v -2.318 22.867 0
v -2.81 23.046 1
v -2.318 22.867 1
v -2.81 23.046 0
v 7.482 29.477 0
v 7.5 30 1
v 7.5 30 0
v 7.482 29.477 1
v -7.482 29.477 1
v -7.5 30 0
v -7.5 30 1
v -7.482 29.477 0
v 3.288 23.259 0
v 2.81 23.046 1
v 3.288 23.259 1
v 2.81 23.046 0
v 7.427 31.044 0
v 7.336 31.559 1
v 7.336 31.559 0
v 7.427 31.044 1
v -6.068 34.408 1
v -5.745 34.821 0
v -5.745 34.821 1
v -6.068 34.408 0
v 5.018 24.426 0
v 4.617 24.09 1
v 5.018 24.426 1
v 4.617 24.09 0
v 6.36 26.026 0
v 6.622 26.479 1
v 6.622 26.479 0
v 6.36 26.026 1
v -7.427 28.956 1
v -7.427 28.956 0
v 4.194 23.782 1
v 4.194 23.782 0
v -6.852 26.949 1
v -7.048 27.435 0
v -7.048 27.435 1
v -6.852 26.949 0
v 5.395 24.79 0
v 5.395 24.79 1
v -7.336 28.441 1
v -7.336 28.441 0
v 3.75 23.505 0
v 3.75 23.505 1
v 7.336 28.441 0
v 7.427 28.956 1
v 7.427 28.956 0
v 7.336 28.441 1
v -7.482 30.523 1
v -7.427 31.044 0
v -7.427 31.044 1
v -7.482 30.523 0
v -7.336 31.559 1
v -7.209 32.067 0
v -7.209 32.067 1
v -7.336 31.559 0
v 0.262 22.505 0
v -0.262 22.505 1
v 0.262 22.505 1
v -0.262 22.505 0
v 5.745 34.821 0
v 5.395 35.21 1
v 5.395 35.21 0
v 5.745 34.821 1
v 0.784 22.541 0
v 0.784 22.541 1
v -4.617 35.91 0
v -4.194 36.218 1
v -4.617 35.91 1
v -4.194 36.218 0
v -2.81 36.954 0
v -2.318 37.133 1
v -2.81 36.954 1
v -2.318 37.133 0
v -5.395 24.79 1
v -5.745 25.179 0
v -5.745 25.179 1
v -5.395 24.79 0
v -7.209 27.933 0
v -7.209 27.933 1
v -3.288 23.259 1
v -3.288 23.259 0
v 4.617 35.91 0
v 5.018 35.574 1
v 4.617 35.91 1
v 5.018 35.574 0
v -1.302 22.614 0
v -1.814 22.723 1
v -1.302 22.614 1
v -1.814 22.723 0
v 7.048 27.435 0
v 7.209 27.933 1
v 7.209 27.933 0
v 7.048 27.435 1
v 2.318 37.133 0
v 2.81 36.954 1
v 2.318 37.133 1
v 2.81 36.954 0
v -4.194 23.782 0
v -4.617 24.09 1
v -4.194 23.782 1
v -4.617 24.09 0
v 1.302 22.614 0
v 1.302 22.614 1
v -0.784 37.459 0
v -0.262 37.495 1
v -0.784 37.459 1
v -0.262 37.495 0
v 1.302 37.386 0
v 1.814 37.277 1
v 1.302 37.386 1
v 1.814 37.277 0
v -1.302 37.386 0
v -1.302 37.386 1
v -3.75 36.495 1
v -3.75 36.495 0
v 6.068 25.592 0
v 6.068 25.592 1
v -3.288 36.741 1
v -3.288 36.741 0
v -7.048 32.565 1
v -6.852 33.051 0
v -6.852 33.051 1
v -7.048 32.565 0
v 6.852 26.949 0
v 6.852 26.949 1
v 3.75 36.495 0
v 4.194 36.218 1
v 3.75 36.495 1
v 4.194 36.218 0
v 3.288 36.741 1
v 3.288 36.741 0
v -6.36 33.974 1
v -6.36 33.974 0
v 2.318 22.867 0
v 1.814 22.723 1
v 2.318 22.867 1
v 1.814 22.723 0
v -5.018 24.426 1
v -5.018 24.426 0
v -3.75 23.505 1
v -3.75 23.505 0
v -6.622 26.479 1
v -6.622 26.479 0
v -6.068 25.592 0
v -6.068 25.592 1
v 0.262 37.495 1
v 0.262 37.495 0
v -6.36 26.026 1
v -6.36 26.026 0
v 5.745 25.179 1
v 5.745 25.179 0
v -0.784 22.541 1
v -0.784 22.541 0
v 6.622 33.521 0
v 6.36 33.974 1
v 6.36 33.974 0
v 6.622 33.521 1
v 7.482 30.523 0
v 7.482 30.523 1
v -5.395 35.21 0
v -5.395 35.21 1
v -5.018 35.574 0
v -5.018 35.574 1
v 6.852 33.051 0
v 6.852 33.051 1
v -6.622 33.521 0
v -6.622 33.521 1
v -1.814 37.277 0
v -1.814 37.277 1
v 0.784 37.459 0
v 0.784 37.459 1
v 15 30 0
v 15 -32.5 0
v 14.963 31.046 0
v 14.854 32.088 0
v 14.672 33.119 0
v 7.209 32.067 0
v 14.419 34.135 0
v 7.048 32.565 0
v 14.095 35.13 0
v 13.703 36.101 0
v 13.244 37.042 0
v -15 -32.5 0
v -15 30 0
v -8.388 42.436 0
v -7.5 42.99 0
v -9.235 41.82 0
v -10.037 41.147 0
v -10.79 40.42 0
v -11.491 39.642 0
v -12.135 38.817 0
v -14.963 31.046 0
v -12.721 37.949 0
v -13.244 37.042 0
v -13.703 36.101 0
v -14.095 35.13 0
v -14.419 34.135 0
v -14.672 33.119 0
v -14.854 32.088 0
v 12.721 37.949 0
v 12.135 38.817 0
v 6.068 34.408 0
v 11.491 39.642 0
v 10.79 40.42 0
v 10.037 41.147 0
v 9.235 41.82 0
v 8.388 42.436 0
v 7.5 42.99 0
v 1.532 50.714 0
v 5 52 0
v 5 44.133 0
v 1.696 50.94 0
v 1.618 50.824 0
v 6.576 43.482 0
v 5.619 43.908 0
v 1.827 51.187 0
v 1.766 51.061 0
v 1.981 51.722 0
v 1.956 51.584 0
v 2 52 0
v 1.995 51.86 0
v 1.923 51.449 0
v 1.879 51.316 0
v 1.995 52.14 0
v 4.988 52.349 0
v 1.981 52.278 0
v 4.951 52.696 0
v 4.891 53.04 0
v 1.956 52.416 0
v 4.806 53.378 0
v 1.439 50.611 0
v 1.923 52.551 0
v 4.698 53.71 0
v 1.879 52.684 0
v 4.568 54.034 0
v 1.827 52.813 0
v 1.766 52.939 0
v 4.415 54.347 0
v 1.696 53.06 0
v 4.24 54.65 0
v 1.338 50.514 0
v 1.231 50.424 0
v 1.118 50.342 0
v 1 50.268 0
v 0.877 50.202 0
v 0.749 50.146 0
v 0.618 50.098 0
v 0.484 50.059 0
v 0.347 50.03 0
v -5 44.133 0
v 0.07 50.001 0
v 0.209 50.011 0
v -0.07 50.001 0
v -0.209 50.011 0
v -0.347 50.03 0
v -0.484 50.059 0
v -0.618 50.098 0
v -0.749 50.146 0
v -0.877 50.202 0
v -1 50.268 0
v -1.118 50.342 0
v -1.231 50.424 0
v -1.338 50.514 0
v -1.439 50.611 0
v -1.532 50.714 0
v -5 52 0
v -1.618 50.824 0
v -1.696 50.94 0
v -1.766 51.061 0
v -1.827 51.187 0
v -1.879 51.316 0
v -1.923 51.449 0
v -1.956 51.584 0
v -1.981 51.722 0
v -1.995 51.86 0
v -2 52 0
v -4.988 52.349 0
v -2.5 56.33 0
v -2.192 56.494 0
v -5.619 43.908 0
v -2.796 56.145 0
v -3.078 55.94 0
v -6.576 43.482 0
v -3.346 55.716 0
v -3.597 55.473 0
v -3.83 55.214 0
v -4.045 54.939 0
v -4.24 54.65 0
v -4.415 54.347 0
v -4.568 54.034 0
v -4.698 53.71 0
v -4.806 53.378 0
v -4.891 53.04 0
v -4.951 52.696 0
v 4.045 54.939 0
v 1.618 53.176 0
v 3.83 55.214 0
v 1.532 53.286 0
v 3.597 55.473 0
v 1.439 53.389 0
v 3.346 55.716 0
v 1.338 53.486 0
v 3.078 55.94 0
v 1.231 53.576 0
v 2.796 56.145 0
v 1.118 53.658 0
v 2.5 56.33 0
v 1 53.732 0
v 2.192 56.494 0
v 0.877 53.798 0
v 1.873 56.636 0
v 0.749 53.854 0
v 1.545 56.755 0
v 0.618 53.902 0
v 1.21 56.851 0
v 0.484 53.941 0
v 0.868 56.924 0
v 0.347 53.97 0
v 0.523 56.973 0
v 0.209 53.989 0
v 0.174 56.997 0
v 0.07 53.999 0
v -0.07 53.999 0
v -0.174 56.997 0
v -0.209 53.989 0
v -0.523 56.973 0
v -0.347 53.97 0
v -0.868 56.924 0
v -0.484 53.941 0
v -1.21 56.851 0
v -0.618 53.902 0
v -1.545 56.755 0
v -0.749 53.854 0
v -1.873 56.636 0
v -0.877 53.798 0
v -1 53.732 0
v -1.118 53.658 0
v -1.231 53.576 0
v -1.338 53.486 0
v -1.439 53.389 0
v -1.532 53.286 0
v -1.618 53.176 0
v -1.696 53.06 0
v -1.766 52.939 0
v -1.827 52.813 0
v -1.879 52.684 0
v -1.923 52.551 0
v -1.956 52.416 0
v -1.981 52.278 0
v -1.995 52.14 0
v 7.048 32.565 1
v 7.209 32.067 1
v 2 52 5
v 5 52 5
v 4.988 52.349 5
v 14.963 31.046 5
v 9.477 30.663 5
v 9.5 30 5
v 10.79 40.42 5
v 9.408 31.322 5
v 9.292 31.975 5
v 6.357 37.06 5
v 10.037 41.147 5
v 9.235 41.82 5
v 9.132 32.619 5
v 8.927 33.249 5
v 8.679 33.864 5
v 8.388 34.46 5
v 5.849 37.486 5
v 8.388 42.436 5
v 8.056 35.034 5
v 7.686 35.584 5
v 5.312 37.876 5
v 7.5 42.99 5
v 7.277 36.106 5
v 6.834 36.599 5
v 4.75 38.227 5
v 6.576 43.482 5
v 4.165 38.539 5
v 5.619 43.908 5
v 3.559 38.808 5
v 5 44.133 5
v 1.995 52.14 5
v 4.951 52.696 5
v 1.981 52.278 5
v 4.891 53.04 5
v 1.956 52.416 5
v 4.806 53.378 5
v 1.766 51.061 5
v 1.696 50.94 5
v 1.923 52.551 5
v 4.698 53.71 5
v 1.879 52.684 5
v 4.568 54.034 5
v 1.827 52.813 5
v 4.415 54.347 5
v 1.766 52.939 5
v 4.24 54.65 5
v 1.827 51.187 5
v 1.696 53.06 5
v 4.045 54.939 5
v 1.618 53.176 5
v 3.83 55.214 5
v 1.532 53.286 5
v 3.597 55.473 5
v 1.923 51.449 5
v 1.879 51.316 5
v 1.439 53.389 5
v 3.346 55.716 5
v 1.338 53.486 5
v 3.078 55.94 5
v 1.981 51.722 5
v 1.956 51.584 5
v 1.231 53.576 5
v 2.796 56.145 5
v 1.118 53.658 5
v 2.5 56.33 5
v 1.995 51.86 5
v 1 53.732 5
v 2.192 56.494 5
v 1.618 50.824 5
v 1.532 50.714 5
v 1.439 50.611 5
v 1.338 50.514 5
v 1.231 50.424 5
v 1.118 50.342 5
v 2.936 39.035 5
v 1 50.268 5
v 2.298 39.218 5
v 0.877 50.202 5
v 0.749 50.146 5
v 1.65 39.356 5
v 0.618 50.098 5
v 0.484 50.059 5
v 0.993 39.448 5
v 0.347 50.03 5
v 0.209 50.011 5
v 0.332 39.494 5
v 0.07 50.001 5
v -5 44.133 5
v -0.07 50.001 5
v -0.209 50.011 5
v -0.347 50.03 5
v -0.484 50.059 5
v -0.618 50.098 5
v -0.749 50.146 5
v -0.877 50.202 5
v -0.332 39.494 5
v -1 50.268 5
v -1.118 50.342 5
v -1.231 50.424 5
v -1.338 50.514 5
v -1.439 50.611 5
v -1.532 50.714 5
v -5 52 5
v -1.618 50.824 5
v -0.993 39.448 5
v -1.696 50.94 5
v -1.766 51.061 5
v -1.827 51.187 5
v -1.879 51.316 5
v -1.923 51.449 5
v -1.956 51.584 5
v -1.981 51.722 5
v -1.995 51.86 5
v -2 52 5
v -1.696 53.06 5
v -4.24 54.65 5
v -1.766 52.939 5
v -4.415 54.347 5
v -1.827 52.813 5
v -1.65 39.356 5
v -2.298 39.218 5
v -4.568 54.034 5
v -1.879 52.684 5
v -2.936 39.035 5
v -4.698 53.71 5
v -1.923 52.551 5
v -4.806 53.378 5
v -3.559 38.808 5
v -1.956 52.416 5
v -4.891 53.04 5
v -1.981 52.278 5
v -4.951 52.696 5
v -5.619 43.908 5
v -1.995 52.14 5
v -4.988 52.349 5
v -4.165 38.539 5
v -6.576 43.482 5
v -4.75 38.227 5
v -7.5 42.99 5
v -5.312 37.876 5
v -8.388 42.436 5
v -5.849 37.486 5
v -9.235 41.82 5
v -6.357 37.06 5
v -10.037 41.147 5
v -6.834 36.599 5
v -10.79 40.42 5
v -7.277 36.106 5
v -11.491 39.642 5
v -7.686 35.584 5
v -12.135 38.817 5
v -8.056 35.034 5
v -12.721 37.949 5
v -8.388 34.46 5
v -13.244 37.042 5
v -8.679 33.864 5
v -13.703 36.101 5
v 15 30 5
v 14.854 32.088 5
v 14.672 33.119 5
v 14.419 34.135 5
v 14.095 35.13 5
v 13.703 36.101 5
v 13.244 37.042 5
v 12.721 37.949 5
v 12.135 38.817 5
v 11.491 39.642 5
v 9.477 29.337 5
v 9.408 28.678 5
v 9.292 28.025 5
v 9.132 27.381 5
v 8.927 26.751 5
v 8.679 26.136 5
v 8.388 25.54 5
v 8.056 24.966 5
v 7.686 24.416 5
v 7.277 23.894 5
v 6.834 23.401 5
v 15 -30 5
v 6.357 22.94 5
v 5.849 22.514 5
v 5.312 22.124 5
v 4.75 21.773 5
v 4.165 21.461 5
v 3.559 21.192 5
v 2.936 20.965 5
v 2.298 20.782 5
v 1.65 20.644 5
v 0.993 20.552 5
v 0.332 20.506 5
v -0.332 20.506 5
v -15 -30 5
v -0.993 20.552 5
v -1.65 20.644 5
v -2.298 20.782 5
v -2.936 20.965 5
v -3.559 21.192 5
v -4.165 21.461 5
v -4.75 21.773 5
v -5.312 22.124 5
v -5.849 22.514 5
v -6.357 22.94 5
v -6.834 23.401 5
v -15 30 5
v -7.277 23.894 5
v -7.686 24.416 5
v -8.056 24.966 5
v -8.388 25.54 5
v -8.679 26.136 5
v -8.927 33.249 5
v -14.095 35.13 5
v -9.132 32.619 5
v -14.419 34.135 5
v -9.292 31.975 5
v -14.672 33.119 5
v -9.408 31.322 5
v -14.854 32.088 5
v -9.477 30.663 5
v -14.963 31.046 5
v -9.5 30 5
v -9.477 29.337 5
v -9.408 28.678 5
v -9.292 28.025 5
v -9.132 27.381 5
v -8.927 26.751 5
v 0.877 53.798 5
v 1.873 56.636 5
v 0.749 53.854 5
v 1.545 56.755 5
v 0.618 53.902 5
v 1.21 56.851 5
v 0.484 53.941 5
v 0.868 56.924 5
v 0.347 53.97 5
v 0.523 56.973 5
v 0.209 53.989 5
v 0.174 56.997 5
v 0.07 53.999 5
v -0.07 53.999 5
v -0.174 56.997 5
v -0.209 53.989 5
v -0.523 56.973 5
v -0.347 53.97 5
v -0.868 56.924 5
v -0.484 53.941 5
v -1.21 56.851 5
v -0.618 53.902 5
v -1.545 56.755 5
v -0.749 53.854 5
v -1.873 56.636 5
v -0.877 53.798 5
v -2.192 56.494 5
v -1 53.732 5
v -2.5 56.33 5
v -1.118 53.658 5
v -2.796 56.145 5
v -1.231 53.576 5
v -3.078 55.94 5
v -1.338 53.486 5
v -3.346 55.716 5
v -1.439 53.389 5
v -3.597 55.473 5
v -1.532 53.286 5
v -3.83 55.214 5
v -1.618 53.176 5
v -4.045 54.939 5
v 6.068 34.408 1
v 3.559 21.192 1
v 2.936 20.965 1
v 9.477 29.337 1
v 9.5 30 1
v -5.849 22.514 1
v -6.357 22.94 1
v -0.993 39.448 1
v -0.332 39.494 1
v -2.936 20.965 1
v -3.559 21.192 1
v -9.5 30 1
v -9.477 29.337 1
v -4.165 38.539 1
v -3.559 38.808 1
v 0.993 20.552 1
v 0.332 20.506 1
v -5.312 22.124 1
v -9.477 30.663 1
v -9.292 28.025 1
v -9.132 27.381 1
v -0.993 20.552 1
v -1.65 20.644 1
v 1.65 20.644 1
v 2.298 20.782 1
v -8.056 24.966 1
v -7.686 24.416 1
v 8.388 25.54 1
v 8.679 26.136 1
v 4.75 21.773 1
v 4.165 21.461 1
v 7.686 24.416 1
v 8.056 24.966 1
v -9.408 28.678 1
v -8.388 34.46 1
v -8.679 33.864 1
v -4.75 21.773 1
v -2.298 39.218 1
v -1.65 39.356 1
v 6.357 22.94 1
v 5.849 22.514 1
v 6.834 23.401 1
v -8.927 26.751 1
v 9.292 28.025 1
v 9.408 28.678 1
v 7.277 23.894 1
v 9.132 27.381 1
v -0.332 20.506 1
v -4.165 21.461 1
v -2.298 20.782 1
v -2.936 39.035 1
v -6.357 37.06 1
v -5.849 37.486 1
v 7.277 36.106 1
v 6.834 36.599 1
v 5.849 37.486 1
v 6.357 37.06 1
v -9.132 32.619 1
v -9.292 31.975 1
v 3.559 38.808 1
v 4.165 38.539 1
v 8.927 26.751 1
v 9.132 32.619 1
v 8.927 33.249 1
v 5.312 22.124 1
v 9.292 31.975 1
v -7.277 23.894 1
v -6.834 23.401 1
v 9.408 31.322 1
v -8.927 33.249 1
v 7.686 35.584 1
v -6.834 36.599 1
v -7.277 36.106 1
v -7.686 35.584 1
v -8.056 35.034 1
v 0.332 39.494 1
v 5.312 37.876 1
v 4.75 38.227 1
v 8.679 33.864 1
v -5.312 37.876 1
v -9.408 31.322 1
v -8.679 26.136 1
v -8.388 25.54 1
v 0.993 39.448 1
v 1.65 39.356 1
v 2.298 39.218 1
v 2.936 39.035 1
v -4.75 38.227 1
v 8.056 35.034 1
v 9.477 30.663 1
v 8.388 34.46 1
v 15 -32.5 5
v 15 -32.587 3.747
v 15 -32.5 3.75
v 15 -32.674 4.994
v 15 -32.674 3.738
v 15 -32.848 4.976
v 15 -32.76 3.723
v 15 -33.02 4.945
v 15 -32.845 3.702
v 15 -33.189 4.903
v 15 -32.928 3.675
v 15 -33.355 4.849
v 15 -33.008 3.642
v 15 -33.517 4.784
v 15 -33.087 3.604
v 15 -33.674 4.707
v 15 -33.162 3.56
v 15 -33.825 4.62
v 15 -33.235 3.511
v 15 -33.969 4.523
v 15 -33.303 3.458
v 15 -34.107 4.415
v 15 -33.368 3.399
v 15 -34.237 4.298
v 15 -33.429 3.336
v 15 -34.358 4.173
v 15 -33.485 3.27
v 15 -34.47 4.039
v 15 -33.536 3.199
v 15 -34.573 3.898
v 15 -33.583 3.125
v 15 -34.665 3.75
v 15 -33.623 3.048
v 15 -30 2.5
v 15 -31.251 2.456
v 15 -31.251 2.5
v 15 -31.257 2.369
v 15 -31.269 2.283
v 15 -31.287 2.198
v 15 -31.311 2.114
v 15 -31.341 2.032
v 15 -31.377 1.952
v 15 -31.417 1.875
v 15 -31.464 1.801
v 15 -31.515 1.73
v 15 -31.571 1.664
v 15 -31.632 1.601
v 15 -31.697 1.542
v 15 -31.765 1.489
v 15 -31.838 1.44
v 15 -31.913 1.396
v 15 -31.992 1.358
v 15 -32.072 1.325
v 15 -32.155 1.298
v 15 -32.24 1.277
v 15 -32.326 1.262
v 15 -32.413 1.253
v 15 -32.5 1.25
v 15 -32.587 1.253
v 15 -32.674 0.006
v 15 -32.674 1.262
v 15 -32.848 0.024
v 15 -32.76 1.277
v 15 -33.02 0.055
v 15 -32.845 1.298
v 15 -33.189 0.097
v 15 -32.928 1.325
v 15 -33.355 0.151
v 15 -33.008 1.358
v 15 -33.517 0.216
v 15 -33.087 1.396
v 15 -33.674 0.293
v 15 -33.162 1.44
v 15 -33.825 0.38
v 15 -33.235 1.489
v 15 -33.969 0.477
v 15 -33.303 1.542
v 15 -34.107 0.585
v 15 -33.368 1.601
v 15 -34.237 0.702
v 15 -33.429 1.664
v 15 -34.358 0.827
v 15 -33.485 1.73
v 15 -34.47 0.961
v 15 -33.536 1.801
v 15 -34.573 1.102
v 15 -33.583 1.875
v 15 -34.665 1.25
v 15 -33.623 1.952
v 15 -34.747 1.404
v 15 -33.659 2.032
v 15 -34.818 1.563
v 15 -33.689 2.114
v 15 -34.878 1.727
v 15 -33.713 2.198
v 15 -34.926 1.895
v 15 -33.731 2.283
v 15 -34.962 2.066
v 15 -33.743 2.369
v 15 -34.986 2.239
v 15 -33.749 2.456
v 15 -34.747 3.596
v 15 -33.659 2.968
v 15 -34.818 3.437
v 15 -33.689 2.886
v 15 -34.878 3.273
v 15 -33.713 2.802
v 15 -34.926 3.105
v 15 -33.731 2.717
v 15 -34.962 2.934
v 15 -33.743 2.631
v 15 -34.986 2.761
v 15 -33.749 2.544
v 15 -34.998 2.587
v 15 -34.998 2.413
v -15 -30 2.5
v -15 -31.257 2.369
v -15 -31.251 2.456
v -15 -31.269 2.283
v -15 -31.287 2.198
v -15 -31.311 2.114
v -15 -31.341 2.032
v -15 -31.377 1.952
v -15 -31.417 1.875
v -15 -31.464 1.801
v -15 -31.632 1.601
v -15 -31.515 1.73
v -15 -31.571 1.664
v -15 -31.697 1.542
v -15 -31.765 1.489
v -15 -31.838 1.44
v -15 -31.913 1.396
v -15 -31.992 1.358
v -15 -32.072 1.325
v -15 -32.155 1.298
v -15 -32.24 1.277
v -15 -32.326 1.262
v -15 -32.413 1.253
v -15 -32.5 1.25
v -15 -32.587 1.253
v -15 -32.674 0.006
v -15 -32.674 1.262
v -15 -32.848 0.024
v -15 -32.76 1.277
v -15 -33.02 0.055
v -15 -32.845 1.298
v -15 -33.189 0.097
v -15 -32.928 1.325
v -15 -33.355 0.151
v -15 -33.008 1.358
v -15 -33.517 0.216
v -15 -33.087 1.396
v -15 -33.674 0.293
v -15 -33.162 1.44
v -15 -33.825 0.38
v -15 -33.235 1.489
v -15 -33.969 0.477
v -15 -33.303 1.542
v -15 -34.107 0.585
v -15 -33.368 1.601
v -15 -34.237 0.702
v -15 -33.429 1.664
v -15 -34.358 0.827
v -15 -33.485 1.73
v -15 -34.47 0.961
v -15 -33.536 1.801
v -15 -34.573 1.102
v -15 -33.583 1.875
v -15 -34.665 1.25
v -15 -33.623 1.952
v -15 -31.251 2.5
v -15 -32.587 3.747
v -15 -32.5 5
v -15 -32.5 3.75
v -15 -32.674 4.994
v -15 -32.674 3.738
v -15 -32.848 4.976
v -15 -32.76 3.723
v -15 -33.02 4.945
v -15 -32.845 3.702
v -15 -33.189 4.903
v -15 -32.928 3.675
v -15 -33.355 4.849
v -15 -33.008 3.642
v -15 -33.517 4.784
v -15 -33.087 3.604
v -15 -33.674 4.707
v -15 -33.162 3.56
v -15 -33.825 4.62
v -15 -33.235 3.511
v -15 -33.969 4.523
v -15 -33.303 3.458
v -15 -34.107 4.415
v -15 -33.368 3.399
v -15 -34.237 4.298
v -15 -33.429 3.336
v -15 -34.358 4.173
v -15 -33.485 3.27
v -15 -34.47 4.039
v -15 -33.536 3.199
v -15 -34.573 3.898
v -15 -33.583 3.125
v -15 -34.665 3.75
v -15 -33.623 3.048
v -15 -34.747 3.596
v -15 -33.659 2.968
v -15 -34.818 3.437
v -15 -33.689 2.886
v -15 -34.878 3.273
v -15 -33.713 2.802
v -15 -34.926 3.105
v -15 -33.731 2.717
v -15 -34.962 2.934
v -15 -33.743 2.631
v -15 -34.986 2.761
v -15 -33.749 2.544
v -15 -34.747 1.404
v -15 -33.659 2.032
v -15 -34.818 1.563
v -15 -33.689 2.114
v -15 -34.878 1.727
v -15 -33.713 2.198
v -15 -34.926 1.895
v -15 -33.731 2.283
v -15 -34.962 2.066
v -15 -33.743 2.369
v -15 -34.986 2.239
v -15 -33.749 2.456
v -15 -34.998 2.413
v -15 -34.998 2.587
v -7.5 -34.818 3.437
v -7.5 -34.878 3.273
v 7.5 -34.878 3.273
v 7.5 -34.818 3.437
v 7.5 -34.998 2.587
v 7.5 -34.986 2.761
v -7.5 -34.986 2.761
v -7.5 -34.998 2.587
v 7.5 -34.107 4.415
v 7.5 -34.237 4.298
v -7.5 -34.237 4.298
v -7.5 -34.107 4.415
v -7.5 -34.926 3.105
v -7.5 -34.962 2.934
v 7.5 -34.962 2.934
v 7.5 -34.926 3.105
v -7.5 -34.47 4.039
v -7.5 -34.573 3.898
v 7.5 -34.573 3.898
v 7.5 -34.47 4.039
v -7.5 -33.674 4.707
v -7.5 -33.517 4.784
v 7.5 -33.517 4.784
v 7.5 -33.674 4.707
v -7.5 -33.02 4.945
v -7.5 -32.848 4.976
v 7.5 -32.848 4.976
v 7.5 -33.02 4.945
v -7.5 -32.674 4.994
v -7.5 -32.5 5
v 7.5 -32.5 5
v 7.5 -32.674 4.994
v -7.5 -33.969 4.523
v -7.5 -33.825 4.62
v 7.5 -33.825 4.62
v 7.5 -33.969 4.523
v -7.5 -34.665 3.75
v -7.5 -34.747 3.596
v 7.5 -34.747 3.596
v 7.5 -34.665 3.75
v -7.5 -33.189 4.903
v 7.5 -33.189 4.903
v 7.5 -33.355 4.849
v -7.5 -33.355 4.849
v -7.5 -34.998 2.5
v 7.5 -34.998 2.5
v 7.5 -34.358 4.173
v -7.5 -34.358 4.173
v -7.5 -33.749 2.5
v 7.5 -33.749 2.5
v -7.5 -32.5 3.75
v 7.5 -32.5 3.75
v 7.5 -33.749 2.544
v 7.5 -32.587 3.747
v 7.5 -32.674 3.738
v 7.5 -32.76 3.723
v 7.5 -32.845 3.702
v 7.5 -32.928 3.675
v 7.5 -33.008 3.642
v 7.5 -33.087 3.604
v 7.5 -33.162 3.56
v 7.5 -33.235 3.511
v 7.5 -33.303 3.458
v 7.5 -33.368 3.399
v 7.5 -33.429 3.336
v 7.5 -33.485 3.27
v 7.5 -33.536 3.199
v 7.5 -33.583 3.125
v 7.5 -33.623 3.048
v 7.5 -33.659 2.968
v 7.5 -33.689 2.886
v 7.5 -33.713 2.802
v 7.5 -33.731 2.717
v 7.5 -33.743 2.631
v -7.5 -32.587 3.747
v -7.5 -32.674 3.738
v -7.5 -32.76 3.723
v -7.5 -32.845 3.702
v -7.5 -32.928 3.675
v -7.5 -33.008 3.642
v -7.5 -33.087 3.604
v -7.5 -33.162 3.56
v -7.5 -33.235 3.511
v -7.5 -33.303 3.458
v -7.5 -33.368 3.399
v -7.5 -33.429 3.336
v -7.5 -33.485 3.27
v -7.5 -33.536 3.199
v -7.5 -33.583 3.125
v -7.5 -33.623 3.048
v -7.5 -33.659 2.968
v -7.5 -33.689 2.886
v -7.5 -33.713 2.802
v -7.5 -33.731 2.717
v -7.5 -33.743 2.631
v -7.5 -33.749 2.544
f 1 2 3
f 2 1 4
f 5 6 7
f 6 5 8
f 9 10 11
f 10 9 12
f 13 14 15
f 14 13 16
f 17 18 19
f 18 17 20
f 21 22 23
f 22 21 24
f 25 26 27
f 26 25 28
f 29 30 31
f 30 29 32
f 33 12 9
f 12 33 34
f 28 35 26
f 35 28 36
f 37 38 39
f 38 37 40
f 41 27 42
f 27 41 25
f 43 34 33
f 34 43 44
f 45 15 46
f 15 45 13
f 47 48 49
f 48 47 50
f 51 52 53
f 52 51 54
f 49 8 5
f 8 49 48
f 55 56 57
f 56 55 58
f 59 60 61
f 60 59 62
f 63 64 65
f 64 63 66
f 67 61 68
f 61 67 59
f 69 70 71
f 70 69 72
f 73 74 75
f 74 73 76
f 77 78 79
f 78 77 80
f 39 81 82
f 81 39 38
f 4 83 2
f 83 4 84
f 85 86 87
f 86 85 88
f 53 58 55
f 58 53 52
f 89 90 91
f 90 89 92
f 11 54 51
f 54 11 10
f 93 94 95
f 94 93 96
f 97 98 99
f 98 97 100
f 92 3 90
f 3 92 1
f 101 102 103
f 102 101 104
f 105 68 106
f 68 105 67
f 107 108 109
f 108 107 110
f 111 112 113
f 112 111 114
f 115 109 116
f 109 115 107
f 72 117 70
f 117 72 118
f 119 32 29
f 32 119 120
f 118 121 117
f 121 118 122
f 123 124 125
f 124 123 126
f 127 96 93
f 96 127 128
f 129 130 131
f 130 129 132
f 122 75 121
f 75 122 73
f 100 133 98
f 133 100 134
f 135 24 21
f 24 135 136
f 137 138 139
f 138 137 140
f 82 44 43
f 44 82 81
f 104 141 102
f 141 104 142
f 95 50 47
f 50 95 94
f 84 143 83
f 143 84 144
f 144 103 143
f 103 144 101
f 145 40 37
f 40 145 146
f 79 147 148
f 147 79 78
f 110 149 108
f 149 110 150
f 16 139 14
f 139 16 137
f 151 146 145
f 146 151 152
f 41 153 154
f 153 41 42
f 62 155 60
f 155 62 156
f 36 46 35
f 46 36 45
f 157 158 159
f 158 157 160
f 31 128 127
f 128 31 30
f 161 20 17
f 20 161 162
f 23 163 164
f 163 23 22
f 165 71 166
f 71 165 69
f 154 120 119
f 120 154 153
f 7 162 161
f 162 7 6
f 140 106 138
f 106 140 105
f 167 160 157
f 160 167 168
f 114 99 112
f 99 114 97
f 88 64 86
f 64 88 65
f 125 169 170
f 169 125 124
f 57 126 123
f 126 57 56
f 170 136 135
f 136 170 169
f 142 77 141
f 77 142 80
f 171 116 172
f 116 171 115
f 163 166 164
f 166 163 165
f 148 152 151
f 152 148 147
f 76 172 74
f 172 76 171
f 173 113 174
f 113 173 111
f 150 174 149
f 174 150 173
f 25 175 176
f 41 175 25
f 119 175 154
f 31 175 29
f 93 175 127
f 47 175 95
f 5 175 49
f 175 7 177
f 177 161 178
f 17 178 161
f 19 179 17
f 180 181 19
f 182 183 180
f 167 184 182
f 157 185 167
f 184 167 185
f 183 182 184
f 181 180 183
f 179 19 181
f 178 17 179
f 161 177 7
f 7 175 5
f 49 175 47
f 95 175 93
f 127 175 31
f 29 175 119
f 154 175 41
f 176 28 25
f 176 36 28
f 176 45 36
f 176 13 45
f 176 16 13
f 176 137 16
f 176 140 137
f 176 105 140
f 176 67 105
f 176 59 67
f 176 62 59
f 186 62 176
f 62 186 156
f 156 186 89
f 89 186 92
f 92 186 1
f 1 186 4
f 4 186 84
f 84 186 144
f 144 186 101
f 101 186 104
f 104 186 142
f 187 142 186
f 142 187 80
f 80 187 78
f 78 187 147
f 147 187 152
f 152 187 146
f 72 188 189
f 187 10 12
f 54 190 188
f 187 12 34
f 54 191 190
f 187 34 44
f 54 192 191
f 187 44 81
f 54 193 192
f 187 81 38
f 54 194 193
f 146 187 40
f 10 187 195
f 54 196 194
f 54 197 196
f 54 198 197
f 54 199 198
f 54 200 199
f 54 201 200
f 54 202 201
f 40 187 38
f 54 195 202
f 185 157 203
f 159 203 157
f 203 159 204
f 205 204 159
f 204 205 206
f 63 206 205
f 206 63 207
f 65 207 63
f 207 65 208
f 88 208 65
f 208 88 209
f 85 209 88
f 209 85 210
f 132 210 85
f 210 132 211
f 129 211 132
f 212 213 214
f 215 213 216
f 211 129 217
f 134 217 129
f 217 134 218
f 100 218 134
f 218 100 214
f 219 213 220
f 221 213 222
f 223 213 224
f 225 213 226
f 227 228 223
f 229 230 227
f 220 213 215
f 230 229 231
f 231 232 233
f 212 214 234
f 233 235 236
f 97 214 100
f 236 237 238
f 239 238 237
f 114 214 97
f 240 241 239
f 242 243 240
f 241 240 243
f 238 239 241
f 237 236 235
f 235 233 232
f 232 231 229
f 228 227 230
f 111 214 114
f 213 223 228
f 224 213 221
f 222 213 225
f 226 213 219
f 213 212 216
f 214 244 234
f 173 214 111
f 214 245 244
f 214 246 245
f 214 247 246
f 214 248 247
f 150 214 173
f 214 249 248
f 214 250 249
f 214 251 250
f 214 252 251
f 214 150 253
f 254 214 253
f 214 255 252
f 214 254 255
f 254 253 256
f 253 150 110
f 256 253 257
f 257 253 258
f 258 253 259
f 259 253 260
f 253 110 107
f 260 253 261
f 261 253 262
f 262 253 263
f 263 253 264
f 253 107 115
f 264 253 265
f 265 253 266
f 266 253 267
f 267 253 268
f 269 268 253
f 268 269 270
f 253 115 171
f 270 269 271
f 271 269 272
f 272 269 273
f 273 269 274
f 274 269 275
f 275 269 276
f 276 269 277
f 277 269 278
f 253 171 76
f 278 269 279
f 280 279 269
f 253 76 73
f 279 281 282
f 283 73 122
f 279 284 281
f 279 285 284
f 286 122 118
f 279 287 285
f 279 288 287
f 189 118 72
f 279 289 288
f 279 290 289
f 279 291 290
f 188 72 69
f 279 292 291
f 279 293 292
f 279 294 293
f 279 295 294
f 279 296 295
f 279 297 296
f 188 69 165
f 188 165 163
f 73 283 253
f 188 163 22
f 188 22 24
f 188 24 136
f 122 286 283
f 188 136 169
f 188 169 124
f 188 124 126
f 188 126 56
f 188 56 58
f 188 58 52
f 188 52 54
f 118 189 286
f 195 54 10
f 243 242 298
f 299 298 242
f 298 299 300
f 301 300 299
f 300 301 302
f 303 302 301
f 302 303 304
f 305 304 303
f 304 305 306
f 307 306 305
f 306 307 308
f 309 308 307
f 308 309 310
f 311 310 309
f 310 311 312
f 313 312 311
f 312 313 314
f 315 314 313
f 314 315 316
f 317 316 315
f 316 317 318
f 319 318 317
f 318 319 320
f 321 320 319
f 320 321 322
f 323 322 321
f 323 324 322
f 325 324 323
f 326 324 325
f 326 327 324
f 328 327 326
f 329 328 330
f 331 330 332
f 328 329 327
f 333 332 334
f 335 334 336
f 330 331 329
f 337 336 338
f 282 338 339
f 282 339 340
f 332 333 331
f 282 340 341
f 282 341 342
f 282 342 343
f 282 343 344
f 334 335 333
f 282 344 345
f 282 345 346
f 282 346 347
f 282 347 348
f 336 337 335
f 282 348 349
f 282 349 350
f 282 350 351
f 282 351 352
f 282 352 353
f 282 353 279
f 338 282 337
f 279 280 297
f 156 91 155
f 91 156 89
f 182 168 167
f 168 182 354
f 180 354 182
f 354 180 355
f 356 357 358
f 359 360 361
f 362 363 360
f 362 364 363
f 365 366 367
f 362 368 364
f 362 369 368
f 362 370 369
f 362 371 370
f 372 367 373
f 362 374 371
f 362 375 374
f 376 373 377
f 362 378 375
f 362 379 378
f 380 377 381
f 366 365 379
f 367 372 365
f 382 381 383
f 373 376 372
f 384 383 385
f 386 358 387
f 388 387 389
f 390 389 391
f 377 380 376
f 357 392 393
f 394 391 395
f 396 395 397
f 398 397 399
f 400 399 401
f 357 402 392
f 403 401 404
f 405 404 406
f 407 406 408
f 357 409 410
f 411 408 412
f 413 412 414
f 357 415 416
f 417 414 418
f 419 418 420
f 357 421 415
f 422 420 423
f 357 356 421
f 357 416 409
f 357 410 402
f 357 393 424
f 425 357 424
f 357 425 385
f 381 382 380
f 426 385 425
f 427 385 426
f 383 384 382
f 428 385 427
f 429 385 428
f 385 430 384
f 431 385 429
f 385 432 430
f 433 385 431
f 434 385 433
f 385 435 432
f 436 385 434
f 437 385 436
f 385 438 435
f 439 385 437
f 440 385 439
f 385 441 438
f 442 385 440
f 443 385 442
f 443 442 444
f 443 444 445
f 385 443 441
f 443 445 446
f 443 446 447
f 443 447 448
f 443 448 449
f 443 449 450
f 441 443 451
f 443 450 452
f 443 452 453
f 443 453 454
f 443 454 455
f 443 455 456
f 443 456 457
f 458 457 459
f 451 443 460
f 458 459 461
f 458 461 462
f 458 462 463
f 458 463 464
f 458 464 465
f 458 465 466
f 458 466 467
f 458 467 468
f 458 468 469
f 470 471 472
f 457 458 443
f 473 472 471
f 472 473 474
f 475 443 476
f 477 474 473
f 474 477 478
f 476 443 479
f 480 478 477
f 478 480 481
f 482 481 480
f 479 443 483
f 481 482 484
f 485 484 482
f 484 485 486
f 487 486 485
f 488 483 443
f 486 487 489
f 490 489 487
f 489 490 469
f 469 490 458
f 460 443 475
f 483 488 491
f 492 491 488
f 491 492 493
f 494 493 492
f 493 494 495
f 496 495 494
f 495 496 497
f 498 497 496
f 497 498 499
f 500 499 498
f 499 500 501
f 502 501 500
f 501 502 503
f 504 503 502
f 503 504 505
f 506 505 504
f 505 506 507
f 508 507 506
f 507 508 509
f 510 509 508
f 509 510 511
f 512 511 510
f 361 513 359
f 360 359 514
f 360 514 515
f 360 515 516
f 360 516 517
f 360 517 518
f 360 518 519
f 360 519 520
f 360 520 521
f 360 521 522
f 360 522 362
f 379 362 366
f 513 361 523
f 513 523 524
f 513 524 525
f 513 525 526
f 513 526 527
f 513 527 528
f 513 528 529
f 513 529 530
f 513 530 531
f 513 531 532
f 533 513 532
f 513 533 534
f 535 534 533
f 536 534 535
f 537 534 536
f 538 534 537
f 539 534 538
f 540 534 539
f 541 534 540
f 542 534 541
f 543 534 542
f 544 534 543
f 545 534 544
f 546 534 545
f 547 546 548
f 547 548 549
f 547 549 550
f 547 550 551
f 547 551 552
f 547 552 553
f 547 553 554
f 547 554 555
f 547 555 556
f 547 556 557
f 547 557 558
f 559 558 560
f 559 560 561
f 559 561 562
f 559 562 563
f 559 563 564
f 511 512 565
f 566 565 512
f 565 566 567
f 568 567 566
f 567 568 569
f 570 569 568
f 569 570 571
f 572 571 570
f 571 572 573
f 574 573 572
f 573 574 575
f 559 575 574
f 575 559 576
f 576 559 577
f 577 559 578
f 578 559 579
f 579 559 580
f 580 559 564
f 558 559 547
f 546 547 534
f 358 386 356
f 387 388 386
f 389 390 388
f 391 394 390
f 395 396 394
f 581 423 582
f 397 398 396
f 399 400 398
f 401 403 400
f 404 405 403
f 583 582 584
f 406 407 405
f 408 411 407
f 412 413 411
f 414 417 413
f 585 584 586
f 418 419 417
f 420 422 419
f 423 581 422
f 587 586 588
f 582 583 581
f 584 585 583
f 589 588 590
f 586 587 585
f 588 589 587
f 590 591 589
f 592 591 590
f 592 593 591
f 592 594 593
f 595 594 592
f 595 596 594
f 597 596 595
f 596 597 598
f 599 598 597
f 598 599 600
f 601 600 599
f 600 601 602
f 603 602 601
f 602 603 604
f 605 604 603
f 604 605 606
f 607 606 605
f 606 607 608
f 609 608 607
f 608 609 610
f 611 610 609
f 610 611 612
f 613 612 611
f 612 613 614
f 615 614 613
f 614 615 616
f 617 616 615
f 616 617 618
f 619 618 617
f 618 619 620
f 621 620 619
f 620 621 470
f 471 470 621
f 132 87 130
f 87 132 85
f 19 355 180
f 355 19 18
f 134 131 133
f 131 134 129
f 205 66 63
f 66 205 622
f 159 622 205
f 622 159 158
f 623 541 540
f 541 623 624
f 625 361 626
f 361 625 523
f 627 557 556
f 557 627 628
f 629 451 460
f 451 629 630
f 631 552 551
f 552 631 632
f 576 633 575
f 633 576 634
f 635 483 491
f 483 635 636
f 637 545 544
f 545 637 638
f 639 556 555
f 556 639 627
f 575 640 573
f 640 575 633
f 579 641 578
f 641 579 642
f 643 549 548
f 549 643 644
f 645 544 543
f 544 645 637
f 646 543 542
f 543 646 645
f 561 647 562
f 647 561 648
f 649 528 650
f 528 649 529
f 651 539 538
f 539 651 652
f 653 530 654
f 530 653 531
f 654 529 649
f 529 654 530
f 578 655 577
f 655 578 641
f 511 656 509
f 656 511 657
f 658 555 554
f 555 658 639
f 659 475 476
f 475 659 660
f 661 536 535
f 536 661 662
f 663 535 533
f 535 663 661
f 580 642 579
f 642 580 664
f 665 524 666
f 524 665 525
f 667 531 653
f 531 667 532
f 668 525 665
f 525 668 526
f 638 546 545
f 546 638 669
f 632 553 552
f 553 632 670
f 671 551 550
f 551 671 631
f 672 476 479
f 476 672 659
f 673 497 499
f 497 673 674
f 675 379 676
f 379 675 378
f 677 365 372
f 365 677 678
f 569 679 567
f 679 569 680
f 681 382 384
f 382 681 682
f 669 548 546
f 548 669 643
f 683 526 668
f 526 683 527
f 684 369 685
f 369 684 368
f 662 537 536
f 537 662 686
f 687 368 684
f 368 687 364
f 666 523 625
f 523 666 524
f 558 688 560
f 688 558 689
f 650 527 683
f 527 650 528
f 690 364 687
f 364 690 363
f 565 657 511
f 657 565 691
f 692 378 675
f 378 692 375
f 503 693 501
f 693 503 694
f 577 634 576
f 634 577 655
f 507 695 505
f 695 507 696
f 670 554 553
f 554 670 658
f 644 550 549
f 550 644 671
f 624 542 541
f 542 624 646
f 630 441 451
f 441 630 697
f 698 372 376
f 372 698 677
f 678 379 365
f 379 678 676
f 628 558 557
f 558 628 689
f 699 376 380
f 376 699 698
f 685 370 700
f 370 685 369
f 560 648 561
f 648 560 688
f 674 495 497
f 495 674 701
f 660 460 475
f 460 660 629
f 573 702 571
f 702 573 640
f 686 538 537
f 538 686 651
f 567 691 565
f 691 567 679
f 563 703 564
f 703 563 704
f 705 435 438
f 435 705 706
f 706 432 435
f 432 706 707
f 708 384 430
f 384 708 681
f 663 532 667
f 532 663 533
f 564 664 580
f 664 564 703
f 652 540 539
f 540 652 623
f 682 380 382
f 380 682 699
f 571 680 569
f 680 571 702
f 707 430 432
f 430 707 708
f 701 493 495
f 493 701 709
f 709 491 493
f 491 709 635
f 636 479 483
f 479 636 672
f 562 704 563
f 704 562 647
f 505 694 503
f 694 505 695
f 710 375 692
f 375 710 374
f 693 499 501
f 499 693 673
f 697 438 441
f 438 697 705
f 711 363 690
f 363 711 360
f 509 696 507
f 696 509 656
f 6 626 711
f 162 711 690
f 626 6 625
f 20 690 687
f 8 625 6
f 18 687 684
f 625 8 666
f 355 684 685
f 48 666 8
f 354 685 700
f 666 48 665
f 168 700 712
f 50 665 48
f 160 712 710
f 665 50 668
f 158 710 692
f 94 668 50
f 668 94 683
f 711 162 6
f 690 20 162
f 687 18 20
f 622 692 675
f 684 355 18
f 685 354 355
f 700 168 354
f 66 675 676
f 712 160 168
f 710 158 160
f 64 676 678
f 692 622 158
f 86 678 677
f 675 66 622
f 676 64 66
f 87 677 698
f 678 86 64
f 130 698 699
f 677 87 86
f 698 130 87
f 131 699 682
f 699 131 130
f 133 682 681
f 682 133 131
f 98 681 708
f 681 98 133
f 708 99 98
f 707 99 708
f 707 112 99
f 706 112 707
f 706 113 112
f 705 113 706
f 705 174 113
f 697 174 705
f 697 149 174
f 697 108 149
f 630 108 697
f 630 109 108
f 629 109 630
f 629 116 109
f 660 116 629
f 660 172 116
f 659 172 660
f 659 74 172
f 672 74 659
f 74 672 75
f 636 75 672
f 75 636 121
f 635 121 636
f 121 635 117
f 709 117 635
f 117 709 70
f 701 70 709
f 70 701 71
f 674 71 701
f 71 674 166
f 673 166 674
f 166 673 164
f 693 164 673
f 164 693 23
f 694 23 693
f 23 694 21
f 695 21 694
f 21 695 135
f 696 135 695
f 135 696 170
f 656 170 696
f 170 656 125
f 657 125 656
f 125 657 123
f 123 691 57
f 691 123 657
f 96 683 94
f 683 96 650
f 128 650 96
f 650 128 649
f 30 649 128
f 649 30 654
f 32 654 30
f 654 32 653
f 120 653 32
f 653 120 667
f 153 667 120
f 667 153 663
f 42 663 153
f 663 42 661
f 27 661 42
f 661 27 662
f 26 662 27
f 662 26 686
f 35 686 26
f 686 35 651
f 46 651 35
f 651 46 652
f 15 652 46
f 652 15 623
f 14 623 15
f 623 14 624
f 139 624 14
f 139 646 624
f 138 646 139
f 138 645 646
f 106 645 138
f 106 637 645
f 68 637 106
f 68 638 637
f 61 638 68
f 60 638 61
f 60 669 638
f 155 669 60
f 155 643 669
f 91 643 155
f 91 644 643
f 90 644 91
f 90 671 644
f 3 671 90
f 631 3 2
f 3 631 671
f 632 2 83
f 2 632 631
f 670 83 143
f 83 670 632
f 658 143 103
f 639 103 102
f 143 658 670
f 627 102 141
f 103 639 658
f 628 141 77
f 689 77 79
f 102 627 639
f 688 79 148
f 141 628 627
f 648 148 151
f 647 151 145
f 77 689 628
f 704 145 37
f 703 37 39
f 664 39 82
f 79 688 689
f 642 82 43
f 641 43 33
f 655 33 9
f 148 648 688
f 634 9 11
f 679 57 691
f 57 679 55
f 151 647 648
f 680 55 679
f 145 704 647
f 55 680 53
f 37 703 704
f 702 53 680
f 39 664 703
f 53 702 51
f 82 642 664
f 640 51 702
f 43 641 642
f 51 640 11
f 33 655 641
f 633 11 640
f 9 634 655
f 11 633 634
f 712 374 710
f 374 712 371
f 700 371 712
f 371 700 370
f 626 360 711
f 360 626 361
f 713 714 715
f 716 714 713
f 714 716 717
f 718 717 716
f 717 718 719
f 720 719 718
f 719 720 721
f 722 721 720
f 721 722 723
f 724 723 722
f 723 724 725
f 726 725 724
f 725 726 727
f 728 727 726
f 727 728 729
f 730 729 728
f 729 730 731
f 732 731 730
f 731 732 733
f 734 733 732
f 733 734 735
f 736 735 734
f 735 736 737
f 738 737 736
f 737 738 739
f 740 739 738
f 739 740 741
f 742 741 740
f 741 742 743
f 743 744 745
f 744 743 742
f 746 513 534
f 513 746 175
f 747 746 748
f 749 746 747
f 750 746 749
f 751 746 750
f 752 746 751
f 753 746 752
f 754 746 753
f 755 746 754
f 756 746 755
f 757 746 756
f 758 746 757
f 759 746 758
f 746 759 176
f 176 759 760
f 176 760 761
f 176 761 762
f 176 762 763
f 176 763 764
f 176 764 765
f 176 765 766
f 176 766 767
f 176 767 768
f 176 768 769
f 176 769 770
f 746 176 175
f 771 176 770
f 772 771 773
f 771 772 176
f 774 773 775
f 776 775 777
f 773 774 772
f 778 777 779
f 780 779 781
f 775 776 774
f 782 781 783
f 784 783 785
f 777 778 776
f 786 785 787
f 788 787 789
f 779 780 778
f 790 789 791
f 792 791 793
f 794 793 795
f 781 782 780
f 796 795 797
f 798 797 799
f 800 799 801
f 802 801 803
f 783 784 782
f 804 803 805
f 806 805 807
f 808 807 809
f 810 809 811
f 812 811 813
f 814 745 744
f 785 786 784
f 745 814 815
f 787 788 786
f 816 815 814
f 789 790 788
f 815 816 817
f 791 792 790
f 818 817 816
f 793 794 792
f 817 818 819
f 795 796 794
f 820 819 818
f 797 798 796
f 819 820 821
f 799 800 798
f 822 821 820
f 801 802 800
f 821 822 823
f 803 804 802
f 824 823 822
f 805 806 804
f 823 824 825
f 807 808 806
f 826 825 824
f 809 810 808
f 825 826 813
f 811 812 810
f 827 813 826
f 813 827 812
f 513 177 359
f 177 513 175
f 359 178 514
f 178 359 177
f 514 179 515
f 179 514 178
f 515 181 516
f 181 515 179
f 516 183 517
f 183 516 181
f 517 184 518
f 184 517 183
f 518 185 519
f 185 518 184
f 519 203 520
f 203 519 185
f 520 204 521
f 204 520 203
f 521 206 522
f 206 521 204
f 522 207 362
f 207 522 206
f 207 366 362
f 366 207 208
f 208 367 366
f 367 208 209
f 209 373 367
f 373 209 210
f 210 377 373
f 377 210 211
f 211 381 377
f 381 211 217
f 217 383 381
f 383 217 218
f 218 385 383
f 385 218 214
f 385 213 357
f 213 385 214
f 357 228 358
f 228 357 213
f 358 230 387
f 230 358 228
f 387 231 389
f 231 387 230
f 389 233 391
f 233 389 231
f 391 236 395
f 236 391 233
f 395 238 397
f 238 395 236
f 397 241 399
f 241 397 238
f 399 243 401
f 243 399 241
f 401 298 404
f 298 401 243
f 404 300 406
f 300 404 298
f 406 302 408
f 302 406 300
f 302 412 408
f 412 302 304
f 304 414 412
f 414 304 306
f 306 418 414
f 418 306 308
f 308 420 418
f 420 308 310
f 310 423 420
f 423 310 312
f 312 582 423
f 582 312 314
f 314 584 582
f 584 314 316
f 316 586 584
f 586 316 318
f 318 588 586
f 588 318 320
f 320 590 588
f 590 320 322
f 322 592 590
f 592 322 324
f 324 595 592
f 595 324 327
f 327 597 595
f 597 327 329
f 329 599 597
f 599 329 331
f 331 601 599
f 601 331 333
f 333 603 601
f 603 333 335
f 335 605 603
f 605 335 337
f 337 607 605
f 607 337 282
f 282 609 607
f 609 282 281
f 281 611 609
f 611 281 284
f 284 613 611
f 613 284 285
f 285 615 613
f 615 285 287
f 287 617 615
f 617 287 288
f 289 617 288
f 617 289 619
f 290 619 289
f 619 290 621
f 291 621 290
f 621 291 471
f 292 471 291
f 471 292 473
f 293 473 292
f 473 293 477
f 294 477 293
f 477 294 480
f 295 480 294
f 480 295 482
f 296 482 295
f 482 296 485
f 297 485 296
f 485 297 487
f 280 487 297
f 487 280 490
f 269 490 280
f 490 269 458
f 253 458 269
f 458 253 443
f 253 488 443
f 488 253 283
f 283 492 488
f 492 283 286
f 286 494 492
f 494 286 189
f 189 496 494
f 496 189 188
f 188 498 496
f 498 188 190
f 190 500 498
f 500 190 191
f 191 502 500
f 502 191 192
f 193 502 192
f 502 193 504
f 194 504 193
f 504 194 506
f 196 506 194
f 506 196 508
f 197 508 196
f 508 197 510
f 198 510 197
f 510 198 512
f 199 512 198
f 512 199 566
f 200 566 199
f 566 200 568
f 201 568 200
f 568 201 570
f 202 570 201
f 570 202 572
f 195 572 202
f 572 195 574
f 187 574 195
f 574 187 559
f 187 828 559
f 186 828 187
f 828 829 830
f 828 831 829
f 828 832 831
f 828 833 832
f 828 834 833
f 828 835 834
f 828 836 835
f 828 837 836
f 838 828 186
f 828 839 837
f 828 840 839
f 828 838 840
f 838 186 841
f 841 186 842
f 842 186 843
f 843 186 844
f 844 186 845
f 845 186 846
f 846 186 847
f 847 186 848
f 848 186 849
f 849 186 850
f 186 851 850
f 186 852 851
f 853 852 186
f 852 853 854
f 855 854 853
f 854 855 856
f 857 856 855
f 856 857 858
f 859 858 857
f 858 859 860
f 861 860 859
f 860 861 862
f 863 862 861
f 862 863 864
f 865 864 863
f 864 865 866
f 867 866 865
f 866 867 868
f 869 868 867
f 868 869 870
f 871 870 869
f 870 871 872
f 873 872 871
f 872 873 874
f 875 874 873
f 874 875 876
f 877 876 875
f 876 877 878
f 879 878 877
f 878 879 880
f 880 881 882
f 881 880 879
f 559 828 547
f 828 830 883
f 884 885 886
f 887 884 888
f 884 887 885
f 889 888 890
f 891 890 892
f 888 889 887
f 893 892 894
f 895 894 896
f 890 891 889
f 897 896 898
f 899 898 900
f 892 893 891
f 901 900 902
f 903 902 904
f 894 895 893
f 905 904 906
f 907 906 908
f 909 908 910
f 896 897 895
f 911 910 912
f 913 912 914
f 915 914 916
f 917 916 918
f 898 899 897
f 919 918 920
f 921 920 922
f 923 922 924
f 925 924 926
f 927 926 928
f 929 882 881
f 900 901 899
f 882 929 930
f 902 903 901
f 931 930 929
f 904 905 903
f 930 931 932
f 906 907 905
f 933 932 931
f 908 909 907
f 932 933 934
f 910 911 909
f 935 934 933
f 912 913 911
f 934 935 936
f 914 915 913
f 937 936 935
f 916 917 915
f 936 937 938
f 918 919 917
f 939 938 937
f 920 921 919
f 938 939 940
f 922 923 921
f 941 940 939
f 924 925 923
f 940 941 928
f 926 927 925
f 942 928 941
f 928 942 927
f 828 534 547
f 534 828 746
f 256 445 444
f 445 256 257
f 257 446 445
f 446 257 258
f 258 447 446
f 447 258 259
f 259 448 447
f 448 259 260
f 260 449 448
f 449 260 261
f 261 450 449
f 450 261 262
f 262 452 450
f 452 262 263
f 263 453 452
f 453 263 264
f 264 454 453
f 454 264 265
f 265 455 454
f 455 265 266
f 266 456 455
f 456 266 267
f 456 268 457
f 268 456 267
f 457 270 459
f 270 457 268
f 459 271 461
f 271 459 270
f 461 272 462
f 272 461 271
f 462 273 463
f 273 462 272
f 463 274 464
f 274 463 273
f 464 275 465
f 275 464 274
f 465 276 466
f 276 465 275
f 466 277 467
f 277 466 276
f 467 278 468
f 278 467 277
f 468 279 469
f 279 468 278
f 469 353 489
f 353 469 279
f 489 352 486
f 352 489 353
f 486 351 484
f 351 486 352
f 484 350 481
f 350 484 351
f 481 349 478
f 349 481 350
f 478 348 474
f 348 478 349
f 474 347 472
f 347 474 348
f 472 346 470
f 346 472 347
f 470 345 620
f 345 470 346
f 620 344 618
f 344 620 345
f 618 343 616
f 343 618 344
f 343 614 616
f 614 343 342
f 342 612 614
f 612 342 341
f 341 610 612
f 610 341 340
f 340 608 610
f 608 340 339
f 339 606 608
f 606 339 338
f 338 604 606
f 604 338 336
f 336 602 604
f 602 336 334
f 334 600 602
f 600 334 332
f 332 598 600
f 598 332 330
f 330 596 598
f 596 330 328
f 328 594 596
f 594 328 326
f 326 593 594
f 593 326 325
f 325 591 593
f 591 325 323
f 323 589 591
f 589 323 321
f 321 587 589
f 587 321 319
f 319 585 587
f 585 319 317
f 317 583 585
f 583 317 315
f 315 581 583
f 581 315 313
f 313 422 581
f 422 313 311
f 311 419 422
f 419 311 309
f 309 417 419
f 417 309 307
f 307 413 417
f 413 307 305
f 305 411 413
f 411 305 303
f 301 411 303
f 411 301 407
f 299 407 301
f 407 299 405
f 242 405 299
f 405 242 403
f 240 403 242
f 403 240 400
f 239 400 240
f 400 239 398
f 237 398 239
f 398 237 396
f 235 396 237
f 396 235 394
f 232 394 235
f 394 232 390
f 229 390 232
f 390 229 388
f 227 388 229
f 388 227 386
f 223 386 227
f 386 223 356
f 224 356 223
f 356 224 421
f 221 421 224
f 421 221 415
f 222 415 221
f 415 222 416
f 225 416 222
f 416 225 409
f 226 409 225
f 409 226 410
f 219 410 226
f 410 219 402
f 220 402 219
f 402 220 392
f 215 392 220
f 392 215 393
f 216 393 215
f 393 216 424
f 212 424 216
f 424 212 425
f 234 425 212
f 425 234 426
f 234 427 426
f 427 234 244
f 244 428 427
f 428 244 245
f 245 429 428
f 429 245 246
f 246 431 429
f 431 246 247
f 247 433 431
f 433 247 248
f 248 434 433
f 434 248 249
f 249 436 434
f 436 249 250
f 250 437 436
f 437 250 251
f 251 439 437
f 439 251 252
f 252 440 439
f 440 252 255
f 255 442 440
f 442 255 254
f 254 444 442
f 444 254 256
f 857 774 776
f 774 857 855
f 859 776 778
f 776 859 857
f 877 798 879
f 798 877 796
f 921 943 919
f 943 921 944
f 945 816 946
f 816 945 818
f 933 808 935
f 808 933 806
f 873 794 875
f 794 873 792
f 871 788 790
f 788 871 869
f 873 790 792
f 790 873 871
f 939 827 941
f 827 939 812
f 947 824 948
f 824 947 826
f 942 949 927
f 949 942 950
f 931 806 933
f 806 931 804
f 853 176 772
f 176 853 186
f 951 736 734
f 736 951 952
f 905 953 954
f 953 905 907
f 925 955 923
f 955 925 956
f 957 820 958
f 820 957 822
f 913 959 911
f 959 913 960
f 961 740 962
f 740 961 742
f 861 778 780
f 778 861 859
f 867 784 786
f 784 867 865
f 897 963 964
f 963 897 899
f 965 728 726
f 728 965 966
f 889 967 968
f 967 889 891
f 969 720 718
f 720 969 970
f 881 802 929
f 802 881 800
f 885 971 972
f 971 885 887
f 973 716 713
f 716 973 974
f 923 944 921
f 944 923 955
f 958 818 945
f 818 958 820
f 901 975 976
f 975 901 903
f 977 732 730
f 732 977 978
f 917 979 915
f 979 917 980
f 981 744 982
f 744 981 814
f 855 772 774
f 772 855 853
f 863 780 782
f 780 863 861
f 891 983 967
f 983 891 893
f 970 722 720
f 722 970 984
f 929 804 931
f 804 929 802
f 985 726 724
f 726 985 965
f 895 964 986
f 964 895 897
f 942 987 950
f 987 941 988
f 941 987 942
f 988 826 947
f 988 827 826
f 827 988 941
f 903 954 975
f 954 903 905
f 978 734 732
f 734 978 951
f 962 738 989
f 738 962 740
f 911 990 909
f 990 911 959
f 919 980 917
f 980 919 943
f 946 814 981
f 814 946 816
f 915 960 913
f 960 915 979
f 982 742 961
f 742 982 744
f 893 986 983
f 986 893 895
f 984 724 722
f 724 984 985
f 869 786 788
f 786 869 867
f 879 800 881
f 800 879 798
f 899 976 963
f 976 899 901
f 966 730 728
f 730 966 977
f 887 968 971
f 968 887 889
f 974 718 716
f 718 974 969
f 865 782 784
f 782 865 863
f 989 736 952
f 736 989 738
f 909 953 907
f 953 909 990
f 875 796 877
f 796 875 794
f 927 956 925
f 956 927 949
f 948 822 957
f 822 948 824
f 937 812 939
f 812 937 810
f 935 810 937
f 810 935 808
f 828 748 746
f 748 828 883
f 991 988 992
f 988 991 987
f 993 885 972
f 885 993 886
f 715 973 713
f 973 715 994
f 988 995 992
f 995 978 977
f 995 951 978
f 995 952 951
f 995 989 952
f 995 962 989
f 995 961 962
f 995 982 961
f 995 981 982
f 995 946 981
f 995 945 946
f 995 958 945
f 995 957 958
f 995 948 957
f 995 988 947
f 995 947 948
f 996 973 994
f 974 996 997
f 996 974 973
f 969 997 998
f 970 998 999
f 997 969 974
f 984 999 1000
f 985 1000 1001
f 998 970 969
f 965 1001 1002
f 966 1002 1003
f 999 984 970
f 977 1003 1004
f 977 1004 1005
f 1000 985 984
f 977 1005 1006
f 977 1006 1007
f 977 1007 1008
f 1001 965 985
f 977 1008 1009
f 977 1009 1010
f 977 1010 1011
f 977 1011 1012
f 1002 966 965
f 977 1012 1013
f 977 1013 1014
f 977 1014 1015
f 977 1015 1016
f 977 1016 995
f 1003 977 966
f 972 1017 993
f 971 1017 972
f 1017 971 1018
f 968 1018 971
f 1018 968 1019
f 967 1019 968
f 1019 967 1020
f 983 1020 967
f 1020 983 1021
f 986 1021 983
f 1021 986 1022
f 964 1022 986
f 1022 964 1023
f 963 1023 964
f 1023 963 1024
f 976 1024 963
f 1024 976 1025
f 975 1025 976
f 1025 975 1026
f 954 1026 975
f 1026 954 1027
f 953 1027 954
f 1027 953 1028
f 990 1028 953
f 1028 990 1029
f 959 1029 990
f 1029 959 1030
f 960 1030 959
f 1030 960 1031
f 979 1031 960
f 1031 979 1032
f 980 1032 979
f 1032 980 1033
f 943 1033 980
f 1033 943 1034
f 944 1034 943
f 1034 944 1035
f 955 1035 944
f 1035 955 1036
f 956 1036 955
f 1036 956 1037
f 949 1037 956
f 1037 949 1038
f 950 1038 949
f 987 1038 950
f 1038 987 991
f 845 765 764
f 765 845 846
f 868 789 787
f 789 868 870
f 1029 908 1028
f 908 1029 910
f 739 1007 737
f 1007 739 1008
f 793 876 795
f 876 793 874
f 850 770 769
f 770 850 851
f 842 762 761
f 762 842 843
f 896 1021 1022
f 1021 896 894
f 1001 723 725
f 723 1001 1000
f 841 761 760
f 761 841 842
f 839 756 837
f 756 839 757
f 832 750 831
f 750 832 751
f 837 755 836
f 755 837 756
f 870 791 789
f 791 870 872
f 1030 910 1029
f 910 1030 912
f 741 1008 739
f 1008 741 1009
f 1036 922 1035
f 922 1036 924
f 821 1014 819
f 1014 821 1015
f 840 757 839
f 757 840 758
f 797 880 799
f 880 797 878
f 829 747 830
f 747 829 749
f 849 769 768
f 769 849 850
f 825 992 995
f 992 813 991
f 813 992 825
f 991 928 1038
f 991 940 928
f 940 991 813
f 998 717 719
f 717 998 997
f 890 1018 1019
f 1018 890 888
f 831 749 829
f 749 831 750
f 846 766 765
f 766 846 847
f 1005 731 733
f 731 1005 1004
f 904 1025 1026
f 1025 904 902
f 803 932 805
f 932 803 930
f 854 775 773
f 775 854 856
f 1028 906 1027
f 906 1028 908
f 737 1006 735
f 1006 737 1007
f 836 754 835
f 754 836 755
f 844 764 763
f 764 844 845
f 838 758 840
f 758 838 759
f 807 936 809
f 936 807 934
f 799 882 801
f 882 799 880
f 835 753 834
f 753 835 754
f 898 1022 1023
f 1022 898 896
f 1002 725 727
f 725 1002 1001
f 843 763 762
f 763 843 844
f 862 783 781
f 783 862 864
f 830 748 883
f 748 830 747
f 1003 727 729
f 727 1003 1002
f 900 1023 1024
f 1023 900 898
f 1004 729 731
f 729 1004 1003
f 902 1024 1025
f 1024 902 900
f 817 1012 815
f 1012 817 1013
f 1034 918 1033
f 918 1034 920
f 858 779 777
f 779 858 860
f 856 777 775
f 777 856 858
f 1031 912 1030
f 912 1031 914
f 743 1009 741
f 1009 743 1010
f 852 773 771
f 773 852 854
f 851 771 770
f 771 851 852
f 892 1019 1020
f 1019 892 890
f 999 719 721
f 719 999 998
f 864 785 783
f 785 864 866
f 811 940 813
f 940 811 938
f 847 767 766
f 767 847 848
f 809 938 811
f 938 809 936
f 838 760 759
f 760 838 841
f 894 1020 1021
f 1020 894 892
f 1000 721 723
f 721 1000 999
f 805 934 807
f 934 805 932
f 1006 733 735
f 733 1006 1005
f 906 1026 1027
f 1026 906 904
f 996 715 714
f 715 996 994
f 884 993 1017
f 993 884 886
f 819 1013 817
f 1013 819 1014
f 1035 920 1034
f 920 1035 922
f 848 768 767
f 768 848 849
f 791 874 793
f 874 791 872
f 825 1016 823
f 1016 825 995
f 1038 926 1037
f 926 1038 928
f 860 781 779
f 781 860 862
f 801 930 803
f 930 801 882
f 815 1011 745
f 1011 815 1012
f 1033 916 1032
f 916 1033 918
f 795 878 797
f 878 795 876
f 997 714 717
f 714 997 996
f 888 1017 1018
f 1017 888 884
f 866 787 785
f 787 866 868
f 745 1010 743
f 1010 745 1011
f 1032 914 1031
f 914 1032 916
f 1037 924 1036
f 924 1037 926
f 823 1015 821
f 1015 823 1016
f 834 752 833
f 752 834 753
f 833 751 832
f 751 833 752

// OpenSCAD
//!OpenSCAD
// title      : JacksonVive Bracket
// author     : Stuart P. Bentley (@stuartpb)
// version    : 0.1.0
// file       : JacksonVive-bracket.scad

/* [Configuration] */

part = "left"; // [left:Left Bracket,right:Right Bracket,both:Both Brackets]

/* [Parameters] */

// The length of the bracket, from the center of the hinge
// to the notch for the headset buckle.
bracket_length = 60;

// The width of the bracket, from edge to edge.
bracket_width = 30;

// The thickness of the bracket.
bracket_depth = 5;

/* [Measurements] */

// The diameter of the channel for the headset buckle (measured as 2mm + .5 tolerance)
buckle_gauge = 2.5;

// The angle of the pivot stop peg to the headset
pivot_stop_peg_angle = 0;

// the width of the arm that attaches to the pivot stop peg
pivot_stop_arm_width = 10;

// the distance between the center of the hinge and the hole in the arm
pivot_stop_peg_distance = 22;

// The diameter of the hole for the pivot stop peg
pivot_stop_peg_diameter = 4;

// The diameter of the larger hole for the hinge
knob_hinge_diameter=19;

// The diameter of the smaller inner hole for the hinge
pivot_stop_hinge_diameter=15;

// The height of the wall that surrounds the smaller inner hole
knob_inset_thickness=1;

/* [Tweaks] */

$fn = 90;

/* [Hidden] */

module bracket(flip) {
  mirror([flip, 0, 0]) {
    difference() {
      linear_extrude(height = bracket_depth) union () {
        square(size=[bracket_width, bracket_length], center=true);

        // The hinge end
        translate([0, bracket_length/2]) {
          circle(d=bracket_width, center=true);
          rotate(pivot_stop_peg_angle)
            difference() {
              // the arm beam
              union() {
                translate([-pivot_stop_arm_width/2, 0])
                  square([pivot_stop_arm_width, pivot_stop_peg_distance]);

                translate([0, pivot_stop_peg_distance])
                  circle(d=pivot_stop_arm_width, center=true);
              }

              // subtract the small hole
              translate([0, pivot_stop_peg_distance, 0])
                circle(d=pivot_stop_peg_diameter, center=true);
            }
        }
      }
      translate([0, bracket_length/2]) union() {
        linear_extrude(height = bracket_depth)
          circle(d=pivot_stop_hinge_diameter, center=true);

        translate([0, 0, knob_inset_thickness])
          linear_extrude(height = bracket_depth - knob_inset_thickness)
            circle(d=knob_hinge_diameter, center=true);
      }
    }

    // The buckle clasp
    translate([0, -bracket_length/2]) {
      difference() {
        union () {
          translate([-bracket_width/2, -bracket_depth/2, 0])
            cube([bracket_width, bracket_depth/2, bracket_depth]);
          translate([-bracket_width/2,-bracket_depth/2,bracket_depth/2]) rotate([0,90,0])
            cylinder(d=bracket_depth, h=bracket_width);
        }
        translate([-bracket_width/2, -buckle_gauge, buckle_gauge])
          cube([bracket_width, buckle_gauge, buckle_gauge]);
        translate([-bracket_width/4, -buckle_gauge*2, buckle_gauge])
          cube([bracket_width/2, buckle_gauge, buckle_gauge]);
        translate([-bracket_width/2,-bracket_depth/2,bracket_depth/2]) rotate([0,90,0])
          cylinder(d=buckle_gauge, h=bracket_width);
      }
    }
  }
}

if (part == "both") {
  translate([ bracket_width/1.5, 0]) bracket(0);
  translate([-bracket_width/1.5, 0]) bracket(1);
}
else if (part == "left") bracket(0);
else if (part == "right") bracket(1);
